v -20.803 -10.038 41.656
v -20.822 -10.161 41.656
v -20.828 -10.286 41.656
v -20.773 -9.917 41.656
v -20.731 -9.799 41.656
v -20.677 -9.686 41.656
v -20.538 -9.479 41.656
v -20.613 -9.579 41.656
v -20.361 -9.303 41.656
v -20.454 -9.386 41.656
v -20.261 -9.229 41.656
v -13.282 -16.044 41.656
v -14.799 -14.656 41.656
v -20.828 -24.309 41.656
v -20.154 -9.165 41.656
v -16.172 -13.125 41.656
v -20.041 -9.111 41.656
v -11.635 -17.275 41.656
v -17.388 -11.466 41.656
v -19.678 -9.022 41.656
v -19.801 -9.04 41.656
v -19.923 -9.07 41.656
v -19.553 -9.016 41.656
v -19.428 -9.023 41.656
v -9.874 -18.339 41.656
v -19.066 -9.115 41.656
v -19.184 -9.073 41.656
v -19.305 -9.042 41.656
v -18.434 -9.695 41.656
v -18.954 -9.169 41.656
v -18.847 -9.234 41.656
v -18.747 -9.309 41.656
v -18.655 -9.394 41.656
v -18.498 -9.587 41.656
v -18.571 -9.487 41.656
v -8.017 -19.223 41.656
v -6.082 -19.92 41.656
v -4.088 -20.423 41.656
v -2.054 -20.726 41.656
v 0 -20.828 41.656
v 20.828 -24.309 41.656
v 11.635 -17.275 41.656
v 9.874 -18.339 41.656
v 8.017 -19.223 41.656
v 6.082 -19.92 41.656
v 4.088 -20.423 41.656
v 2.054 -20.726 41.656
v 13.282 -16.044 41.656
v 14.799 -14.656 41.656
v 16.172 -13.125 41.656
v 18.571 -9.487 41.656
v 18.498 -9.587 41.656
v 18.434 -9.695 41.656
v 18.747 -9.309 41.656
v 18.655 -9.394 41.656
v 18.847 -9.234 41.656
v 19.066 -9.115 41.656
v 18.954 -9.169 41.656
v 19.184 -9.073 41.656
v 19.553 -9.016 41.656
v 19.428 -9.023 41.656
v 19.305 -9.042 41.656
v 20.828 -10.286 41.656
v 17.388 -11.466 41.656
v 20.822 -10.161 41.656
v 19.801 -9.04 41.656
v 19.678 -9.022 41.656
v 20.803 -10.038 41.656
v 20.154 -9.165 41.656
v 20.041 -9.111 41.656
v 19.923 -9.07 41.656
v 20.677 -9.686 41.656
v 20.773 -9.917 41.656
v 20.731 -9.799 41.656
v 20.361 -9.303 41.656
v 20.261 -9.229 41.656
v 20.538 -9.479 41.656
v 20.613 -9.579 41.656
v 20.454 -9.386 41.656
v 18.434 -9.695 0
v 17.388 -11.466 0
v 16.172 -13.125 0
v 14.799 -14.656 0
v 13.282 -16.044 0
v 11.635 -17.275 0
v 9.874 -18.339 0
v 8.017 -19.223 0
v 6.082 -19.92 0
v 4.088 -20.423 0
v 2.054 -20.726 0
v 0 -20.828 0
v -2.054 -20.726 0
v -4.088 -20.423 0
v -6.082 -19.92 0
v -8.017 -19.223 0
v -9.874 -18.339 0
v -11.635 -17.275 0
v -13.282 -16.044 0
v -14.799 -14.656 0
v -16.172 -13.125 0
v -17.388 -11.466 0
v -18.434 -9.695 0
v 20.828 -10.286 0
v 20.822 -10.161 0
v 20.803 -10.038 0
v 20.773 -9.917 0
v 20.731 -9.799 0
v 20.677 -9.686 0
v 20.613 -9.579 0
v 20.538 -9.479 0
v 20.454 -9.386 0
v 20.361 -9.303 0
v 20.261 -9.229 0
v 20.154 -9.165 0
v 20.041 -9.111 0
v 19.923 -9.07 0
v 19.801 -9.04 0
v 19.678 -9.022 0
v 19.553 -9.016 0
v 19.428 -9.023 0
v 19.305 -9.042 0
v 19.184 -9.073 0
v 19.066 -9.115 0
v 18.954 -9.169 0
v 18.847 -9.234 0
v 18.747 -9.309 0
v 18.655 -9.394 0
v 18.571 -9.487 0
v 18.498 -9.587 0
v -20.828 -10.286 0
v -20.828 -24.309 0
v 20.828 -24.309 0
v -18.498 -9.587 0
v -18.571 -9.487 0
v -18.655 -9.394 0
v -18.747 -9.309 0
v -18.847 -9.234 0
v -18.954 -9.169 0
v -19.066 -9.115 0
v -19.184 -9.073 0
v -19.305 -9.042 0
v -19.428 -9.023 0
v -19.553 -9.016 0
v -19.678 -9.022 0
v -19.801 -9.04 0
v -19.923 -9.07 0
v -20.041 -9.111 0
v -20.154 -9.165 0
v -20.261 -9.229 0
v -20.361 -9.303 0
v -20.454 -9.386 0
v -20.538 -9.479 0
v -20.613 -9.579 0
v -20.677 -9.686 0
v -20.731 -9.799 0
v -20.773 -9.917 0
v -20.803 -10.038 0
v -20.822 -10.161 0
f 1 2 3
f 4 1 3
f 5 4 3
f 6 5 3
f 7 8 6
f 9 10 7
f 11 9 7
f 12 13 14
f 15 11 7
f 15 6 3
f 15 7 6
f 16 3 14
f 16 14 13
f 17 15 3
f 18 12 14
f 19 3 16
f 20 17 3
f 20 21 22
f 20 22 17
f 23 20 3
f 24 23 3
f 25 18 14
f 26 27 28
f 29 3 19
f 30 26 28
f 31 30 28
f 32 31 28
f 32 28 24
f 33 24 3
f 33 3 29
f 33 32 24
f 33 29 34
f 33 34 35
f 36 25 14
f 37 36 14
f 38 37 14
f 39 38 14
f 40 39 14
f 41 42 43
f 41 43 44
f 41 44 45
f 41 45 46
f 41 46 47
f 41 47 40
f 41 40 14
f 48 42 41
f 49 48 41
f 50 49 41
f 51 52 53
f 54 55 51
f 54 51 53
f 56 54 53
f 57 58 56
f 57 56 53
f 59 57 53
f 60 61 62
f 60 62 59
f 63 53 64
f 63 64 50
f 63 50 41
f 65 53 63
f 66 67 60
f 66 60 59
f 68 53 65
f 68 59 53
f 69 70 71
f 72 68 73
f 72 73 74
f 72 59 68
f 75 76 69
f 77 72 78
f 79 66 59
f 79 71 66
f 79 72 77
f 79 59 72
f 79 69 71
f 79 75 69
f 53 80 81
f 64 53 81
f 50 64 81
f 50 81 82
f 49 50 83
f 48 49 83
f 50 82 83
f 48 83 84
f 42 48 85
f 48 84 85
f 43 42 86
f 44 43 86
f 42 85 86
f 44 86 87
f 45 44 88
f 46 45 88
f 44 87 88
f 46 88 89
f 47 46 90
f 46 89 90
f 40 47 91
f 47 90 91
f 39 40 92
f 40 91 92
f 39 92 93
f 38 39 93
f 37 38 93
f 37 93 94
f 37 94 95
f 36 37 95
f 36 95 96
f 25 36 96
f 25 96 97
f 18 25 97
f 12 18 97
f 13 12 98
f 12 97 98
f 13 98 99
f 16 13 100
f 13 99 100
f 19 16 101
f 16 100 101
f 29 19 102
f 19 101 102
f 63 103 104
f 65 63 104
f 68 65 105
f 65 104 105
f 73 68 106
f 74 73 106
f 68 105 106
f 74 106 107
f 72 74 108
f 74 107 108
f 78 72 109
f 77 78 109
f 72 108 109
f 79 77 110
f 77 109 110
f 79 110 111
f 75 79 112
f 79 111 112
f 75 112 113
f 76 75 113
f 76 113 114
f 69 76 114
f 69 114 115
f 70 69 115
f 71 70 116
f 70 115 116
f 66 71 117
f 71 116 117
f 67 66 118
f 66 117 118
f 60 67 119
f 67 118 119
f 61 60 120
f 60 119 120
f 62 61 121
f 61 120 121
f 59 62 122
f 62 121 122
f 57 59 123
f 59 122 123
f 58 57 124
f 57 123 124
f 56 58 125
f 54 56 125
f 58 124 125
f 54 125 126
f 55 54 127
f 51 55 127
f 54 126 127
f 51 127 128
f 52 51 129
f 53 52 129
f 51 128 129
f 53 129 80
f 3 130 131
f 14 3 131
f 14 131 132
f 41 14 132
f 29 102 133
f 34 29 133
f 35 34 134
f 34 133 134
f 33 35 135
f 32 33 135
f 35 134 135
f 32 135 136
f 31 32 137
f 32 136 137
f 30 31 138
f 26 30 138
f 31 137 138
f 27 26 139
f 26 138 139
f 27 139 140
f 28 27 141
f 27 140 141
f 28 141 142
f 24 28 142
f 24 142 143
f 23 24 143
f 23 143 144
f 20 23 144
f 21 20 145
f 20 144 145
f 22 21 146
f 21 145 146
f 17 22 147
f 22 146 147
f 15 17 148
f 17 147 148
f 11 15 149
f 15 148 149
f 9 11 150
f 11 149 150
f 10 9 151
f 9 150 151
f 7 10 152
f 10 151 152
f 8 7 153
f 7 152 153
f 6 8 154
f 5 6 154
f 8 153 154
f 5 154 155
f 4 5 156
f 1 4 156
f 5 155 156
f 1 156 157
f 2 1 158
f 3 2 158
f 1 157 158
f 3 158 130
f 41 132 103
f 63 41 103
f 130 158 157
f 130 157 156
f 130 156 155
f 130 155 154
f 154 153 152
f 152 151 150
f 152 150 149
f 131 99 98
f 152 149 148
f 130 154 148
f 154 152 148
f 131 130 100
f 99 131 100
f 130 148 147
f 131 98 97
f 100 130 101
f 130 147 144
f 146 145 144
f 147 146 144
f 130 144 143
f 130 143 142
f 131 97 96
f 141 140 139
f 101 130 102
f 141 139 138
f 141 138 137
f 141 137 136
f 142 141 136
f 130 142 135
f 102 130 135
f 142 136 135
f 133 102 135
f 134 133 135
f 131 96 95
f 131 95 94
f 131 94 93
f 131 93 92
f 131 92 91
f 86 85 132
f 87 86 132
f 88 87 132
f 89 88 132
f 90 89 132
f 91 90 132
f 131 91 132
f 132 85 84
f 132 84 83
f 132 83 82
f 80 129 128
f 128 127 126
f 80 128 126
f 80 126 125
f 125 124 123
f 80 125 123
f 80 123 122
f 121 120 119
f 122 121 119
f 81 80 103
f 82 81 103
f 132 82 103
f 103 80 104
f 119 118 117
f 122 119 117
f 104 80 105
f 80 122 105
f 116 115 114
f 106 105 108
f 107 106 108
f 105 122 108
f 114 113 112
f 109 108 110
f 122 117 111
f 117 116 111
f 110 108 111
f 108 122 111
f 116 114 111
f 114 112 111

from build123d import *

# Parameters (mm, degrees)
BOSS_EXTRUDE1_DEPTH = 41.656


with BuildPart() as part:
    # Sketch1 → Boss-Extrude1 (new body)
    with BuildSketch(Plane.XY):
        with BuildLine():
            Line((-20.828, -10.28621602), (-20.828, -24.308623206))
            Line((-20.828, -24.308623206), (20.828, -24.308623206))
            Line((20.828, -24.308623206), (20.828, -10.28621602))
            ThreePointArc((20.828, -10.28621602), (19.862459196, -9.053250246), (18.433977011, -9.695054179))
            ThreePointArc((18.433977011, -9.695054179), (0, -20.828), (-18.433977011, -9.695054179))
            ThreePointArc((-18.433977011, -9.695054179), (-19.862459196, -9.053250246), (-20.828, -10.28621602))
        make_face()
    extrude(amount=BOSS_EXTRUDE1_DEPTH)


solid = part.part
